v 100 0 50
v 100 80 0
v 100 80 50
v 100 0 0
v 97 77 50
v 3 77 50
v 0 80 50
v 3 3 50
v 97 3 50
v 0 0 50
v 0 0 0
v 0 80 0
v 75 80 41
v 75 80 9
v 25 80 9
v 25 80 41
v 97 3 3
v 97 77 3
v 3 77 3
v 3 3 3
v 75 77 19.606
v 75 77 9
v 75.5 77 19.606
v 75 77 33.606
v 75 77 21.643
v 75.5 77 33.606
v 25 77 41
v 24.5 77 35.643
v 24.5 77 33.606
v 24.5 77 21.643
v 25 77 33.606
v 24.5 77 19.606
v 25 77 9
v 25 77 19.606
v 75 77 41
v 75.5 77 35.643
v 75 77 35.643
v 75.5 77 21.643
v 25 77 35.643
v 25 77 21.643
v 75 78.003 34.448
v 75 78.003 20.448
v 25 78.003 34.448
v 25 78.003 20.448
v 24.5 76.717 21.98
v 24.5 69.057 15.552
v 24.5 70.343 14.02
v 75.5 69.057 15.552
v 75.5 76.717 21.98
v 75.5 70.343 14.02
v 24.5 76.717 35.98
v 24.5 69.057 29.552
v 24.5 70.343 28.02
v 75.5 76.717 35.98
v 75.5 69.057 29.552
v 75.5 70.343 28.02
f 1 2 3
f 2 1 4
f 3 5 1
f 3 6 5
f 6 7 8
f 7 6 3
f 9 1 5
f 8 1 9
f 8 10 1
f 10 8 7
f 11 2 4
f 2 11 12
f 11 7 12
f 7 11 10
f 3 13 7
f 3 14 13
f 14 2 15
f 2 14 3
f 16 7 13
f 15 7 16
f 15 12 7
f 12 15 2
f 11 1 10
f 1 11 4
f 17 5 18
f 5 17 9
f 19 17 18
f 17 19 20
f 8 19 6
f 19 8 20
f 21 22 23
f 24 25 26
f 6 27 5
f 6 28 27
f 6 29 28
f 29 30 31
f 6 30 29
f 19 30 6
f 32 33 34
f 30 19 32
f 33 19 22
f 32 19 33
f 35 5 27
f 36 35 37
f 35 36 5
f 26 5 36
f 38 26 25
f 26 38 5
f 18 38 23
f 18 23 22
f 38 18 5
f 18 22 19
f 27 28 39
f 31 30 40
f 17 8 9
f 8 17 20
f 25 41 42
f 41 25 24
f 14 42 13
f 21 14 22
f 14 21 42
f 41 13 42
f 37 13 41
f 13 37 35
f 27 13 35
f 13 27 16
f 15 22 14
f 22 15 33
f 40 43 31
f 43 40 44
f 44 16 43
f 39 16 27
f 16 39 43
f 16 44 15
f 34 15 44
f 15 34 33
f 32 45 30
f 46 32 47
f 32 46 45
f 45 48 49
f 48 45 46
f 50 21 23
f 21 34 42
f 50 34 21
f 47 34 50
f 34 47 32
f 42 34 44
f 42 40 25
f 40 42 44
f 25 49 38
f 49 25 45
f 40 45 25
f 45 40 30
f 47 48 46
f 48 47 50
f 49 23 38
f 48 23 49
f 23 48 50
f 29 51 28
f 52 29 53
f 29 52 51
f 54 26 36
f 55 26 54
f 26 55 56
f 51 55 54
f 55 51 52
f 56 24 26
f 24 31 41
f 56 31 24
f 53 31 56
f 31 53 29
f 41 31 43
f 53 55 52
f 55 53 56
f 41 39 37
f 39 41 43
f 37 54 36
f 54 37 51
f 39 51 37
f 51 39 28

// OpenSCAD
$fn = 32;

// ----------------------------------------------------------------------
// Vent box: louvers enclosure
// ----------------------------------------------------------------------

// --- parameters (mm) ---
box_l = 100;              // box length, X
box_w = 80;               // box width, Y
box_h = 50;               // box height, Z
wall_t = 3;               // shell wall thickness
win_l = 50;               // vent window width, X
win_h = 32;               // vent window height, Z
slat_t = 2;               // louver slat thickness
slat_d = 10;              // louver slat depth
slat_a = 40;              // louver slat angle, degrees
slat_pitch = 14;          // louver pitch
slat_yc = 73.53;          // slat centreline Y

win_z0 = (box_h - win_h) / 2;  // window lower edge Z
n_slats = 2;  // louver count
slat_z0 = win_z0 + (win_h - (n_slats - 1) * slat_pitch) / 2;

difference() {
  union() {
    difference() {
      cube([box_l, box_w, box_h]);
  translate([wall_t, wall_t, wall_t])
    cube([box_l - 2 * wall_t, box_w - 2 * wall_t, box_h]);
  translate([(box_l - win_l) / 2, box_w - wall_t - 1, win_z0])
    cube([win_l, wall_t + 2, win_h]);
    }
    for (i = [0 : n_slats - 1])
      translate([box_l / 2, slat_yc, slat_z0 + i * slat_pitch])
        rotate([slat_a, 0, 0])
          cube([win_l + 1, slat_d, slat_t], center = true);
  }
}
